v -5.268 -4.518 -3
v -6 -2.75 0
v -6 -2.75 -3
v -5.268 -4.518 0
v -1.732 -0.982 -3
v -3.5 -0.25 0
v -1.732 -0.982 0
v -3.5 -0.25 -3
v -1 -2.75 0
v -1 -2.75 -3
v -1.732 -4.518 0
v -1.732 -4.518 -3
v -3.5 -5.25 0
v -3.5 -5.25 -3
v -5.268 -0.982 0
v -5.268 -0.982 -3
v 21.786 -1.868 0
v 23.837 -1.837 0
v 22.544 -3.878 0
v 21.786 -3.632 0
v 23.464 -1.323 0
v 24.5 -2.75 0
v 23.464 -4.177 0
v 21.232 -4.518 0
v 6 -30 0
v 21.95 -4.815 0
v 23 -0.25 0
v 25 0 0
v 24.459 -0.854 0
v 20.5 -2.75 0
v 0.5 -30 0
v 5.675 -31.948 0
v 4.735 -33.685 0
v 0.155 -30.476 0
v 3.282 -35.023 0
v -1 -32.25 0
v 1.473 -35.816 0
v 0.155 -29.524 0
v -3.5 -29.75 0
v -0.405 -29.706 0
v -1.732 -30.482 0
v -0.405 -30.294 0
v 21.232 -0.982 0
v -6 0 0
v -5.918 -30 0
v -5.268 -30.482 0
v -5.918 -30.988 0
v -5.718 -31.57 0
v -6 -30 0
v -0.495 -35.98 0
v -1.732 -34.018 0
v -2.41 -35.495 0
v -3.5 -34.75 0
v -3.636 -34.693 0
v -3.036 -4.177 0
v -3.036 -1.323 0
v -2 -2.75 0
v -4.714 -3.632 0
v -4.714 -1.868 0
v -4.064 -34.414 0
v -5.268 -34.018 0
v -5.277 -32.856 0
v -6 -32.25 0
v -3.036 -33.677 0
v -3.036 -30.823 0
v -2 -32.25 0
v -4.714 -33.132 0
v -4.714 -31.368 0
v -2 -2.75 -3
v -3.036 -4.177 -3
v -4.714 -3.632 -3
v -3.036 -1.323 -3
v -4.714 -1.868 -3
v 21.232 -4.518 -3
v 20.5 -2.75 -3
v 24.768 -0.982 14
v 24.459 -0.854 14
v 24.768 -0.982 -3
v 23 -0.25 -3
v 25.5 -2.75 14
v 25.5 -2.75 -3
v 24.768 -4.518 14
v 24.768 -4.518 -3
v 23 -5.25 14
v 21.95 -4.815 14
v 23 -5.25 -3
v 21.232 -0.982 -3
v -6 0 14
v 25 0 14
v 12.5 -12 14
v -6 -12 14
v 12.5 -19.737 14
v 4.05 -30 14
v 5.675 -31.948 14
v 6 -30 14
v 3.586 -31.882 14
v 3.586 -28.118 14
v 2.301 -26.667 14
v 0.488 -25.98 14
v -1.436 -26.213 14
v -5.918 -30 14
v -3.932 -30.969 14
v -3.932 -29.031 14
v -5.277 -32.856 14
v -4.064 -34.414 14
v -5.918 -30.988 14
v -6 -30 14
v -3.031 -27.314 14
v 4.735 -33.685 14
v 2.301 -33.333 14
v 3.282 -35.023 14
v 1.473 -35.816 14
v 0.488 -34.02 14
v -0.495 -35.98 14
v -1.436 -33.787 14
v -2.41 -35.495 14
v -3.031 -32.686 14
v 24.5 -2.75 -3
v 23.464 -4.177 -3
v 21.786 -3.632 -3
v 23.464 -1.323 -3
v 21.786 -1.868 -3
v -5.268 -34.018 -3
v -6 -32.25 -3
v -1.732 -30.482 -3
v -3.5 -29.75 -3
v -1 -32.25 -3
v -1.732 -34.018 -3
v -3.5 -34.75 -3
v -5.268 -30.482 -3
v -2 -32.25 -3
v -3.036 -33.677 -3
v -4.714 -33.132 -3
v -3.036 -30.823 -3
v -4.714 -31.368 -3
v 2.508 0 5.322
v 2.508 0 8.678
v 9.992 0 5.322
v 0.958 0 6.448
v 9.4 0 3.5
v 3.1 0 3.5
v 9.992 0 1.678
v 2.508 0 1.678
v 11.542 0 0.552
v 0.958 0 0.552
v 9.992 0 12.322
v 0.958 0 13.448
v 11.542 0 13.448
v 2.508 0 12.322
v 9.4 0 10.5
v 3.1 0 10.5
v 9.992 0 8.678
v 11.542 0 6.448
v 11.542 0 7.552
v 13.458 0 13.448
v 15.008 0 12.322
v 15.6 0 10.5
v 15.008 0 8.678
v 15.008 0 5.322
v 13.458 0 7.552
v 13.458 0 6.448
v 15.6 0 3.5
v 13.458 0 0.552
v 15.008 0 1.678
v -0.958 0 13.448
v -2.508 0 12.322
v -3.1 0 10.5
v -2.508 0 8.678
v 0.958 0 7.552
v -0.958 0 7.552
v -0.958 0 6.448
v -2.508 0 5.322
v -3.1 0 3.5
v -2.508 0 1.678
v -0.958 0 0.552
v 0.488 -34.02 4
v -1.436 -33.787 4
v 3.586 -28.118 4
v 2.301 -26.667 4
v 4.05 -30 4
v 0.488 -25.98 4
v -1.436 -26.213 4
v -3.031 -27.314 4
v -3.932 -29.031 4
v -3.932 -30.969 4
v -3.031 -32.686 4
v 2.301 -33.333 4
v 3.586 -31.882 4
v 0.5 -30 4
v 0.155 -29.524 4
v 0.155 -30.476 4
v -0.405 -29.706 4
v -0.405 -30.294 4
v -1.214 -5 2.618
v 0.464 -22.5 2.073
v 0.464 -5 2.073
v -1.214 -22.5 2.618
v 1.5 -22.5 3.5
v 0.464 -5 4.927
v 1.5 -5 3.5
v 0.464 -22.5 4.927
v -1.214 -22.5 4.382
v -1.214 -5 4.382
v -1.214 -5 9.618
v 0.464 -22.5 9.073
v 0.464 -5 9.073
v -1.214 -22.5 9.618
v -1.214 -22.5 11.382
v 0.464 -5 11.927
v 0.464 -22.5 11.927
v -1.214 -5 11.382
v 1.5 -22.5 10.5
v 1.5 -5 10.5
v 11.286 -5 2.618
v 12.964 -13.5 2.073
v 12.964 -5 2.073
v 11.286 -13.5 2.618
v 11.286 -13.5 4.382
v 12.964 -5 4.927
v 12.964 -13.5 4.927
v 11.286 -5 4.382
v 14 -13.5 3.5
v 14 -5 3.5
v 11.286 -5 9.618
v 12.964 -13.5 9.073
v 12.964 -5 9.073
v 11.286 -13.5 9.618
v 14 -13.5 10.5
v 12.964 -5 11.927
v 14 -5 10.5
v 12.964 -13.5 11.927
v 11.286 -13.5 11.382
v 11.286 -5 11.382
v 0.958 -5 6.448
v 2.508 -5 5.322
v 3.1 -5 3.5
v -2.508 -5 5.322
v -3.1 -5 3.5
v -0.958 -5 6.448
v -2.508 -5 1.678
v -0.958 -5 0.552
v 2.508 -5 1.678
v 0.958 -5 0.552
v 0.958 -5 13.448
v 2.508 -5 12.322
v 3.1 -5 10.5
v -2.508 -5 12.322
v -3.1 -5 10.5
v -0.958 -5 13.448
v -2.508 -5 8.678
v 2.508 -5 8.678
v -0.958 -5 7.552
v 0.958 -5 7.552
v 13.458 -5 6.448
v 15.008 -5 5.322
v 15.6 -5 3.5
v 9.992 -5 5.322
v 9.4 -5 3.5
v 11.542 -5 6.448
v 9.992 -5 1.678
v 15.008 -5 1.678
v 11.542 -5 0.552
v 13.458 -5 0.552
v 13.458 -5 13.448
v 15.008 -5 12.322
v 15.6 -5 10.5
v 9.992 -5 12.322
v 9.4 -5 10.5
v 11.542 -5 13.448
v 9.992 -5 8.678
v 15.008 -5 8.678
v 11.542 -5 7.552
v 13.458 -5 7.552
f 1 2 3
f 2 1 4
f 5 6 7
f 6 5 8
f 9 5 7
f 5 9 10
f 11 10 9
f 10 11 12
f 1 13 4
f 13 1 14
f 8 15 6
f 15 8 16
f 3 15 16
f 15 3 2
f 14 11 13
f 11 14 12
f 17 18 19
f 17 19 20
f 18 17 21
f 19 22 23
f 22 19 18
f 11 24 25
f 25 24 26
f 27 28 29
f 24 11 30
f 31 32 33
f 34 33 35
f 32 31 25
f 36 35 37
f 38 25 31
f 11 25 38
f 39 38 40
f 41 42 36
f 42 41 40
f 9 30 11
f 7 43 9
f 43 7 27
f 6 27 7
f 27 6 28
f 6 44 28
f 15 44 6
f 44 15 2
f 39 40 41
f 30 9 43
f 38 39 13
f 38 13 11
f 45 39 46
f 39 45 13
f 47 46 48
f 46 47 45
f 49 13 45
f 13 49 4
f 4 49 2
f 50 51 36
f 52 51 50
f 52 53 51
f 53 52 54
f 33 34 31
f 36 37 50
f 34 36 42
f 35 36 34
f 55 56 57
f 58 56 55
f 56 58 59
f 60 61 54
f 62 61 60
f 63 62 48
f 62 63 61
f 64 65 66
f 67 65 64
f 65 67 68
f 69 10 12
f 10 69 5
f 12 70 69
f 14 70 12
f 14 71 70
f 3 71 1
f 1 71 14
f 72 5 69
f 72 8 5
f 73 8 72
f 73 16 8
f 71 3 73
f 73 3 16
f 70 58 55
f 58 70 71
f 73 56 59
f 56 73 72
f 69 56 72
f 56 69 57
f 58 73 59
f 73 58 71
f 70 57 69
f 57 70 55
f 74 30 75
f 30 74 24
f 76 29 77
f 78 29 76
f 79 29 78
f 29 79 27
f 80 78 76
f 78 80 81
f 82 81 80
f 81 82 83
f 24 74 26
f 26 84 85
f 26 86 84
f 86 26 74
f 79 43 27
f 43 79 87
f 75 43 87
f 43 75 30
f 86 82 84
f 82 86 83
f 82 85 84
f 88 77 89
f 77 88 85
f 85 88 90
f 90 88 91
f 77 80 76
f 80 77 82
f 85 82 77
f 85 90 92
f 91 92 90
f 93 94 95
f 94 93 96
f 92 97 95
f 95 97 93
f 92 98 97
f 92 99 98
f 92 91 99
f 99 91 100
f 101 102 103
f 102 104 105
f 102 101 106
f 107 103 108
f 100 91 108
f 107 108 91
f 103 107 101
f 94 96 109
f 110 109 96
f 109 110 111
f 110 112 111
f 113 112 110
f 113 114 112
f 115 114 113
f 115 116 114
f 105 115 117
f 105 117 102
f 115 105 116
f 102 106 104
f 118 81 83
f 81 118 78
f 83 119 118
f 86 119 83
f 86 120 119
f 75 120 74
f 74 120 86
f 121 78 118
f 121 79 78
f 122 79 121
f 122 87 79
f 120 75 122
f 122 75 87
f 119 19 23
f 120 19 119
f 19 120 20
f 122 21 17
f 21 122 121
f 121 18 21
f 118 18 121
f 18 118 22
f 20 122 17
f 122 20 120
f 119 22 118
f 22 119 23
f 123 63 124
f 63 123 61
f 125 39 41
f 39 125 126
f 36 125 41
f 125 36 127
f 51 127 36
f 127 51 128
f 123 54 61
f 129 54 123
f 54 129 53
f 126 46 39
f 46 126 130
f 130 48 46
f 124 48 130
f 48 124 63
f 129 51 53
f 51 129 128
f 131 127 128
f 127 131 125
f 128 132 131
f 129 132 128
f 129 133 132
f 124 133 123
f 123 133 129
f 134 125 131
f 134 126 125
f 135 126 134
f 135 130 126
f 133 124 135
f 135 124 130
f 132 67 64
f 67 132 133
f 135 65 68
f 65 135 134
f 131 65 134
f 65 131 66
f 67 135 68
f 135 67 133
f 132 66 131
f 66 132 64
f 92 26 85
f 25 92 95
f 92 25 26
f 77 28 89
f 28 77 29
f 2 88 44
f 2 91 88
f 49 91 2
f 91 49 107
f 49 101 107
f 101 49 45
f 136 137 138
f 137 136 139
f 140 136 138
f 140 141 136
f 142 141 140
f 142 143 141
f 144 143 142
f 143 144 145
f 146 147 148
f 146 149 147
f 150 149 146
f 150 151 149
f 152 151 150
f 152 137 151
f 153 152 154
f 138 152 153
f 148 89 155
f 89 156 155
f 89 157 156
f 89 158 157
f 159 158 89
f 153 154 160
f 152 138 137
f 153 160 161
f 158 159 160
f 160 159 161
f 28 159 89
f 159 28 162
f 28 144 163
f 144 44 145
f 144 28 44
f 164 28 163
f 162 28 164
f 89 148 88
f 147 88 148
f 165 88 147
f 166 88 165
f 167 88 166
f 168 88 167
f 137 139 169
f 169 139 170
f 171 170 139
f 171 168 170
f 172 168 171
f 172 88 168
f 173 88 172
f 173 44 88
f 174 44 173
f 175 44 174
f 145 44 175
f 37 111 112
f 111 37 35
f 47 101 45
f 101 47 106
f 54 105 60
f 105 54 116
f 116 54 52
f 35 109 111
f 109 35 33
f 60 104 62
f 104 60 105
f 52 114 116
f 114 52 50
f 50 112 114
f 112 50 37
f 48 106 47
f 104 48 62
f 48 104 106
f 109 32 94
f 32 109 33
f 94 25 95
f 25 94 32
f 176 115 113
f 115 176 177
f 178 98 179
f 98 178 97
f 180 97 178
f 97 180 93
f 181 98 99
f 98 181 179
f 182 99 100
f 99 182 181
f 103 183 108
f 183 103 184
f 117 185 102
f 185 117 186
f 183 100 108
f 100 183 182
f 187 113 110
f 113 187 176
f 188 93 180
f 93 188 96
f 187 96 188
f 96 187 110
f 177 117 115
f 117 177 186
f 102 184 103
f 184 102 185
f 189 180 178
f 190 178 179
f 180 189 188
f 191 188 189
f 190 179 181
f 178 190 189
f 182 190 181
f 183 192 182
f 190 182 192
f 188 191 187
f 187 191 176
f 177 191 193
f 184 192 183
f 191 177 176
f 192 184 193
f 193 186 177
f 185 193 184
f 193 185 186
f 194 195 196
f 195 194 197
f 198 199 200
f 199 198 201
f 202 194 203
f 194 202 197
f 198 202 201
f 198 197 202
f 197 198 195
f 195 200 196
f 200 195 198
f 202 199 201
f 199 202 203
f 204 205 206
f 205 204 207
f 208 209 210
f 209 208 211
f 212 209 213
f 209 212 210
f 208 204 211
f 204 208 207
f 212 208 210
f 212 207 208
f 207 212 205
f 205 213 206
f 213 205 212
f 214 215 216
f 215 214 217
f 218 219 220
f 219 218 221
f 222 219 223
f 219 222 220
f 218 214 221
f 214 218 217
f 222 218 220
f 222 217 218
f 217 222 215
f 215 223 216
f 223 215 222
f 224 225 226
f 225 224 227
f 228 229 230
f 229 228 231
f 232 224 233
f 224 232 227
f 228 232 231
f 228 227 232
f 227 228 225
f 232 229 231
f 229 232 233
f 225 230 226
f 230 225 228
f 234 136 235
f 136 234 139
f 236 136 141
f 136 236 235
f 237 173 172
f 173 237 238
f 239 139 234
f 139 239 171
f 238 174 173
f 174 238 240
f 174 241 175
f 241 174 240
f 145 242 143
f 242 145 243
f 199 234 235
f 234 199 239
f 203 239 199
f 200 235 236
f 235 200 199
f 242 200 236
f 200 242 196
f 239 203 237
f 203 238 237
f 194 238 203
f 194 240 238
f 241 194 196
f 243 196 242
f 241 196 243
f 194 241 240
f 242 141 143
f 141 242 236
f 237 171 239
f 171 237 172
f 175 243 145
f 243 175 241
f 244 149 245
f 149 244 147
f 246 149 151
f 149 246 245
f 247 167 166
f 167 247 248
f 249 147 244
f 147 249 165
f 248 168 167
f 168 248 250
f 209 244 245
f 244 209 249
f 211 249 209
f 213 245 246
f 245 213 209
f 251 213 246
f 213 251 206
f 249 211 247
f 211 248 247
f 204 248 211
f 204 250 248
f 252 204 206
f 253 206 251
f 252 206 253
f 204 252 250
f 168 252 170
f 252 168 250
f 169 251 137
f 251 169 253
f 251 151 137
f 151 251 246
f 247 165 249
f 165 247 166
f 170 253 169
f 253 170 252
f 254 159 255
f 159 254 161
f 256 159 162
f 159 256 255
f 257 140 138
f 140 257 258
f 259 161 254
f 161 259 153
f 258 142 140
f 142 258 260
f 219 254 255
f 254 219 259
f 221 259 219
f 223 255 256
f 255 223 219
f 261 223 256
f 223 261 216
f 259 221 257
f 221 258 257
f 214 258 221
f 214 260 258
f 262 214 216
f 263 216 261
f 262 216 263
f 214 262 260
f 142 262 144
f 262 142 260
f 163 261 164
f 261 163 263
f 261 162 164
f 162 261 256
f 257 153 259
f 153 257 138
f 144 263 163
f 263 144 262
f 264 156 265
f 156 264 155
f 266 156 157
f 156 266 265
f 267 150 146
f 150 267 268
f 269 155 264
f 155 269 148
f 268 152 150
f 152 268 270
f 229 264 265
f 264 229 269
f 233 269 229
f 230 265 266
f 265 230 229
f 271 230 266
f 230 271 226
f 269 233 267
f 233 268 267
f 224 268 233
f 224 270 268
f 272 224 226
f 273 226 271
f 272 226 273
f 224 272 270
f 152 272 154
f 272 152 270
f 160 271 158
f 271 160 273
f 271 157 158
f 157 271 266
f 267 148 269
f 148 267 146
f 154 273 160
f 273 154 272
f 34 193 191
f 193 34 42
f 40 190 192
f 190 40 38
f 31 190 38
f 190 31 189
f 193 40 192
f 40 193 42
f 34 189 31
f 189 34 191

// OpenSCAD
//include <NopSCADlib/core.scad>
//include <NopSCADlib/vitamins/pcbs.scad>
//include <NopSCADlib/vitamins/pcb.scad>

axle_mount_thickness=14;
axle_mount_tip_thickness=18;
root_height=25;
axle_mount_tip_radius=6;
axle_mount_length=30;

m3_hole_radius=1.5;

// Variables from backplate.scad
mount_support_radius=m3_hole_radius+1.6;
mount_support_height=5;

module plain_axle_mount() {
    color("PaleGreen",0.7) 
    difference() {
        // main body
        union() {
            // form the base
            points=[[root_height,0],[axle_mount_tip_radius,-axle_mount_length],[-axle_mount_tip_radius,-axle_mount_length],[-axle_mount_tip_radius,0]];
            linear_extrude(axle_mount_thickness, center = false, convexity = 4) 
                polygon(points);
            // form the tip
            linear_extrude(axle_mount_tip_thickness, center = false, convexity = 4) 
                translate([0,-axle_mount_length,0]) circle(r=axle_mount_tip_radius);
        }
        // cutout for the axle
        translate([0,-axle_mount_length,axle_mount_tip_thickness-axle_mount_thickness]) 
            cylinder(h=axle_mount_thickness+1, r=4.05);
        // holes for the screws
        translate([0,0.5,axle_mount_thickness/4]) rotate(a=90, v=[1,0,0]) cylinder(h=22+1, r=m3_hole_radius);
        translate([0,0.5,axle_mount_thickness*3/4]) rotate(a=90, v=[1,0,0]) cylinder(h=22+1, r=m3_hole_radius);
        translate([root_height/2,0.5,axle_mount_thickness/4]) rotate(a=90, v=[1,0,0]) cylinder(h=13+1, r=m3_hole_radius);
        translate([root_height/2,0.5,axle_mount_thickness*3/4]) rotate(a=90, v=[1,0,0]) cylinder(h=13+1, r=m3_hole_radius);
        // holes for the mount supports on the backplate
        translate([0,1,axle_mount_thickness/4]) rotate(a=90, v=[1,0,0]) 
            cylinder(h=mount_support_height+1, r=mount_support_radius);
        translate([0,1,axle_mount_thickness*3/4]) rotate(a=90, v=[1,0,0]) 
            cylinder(h=mount_support_height+1, r=mount_support_radius);
        translate([root_height/2,1,axle_mount_thickness/4]) rotate(a=90, v=[1,0,0]) 
            cylinder(h=mount_support_height+1, r=mount_support_radius);
        translate([root_height/2,1,axle_mount_thickness*3/4]) rotate(a=90, v=[1,0,0]) 
            cylinder(h=mount_support_height+1, r=mount_support_radius);
        // tiny hole to let air into the cylinder
        translate([0,-axle_mount_length,-0.5]) cylinder(h=axle_mount_tip_thickness-axle_mount_thickness+1, d=1);
    }
}

// guide holes for the screws
/*
translate([0,0.5,axle_mount_thickness/4]) rotate(a=90, v=[1,0,0]) cylinder(h=22+1, r=m3_hole_radius);
translate([0,0.5,axle_mount_thickness*3/4]) rotate(a=90, v=[1,0,0]) cylinder(h=22+1, r=m3_hole_radius);
translate([root_height/2,0.5,axle_mount_thickness/4]) rotate(a=90, v=[1,0,0]) cylinder(h=13+1, r=m3_hole_radius);
translate([root_height/2,0.5,axle_mount_thickness*3/4]) rotate(a=90, v=[1,0,0]) cylinder(h=13+1, r=m3_hole_radius);
*/

// standoffs for mounting the ULN2003 driver board using M3x4 screws
module standoff(support=3) {
    color("Crimson", 0.2)
    difference() {
        // main body
        cylinder(h=support, d=5);
        // cutout m3 hole
        translate([0,0,-1]) cylinder(h=3+1, r=m3_hole_radius);
    }
}
//standoff();

module front_axle_mount(standoff_offset=0) {
    //color("PaleGreen",0.7)
    union() {
        // add the standoffs for the ULN2003 driver board
        translate([standoff_offset-3.5,-2.75,-3]) standoff();
        //translate([-2.75,-2.75,-3]) standoff();
        translate([standoff_offset-3.5+23.5+3,-2.75,-3]) standoff(support=3+axle_mount_thickness);
        translate([standoff_offset-3.5,-2.75-26.5-3,-3]) standoff();
        // main body using plain_axle_mount
        difference() {
            plain_axle_mount();
            // remove the protrusion for 3d-printing on the top face
            translate([-root_height/2,-axle_mount_length-axle_mount_tip_radius-1,axle_mount_thickness]) 
                cube([root_height,root_height,axle_mount_tip_thickness-axle_mount_thickness+1]);
        }

    }
}

front_axle_mount();


//translate([10,-18,-3]) rotate(a=90, v=[0,0,1]) rotate(a=180, v=[0,1,0]) pcb(ZC_A0591);
